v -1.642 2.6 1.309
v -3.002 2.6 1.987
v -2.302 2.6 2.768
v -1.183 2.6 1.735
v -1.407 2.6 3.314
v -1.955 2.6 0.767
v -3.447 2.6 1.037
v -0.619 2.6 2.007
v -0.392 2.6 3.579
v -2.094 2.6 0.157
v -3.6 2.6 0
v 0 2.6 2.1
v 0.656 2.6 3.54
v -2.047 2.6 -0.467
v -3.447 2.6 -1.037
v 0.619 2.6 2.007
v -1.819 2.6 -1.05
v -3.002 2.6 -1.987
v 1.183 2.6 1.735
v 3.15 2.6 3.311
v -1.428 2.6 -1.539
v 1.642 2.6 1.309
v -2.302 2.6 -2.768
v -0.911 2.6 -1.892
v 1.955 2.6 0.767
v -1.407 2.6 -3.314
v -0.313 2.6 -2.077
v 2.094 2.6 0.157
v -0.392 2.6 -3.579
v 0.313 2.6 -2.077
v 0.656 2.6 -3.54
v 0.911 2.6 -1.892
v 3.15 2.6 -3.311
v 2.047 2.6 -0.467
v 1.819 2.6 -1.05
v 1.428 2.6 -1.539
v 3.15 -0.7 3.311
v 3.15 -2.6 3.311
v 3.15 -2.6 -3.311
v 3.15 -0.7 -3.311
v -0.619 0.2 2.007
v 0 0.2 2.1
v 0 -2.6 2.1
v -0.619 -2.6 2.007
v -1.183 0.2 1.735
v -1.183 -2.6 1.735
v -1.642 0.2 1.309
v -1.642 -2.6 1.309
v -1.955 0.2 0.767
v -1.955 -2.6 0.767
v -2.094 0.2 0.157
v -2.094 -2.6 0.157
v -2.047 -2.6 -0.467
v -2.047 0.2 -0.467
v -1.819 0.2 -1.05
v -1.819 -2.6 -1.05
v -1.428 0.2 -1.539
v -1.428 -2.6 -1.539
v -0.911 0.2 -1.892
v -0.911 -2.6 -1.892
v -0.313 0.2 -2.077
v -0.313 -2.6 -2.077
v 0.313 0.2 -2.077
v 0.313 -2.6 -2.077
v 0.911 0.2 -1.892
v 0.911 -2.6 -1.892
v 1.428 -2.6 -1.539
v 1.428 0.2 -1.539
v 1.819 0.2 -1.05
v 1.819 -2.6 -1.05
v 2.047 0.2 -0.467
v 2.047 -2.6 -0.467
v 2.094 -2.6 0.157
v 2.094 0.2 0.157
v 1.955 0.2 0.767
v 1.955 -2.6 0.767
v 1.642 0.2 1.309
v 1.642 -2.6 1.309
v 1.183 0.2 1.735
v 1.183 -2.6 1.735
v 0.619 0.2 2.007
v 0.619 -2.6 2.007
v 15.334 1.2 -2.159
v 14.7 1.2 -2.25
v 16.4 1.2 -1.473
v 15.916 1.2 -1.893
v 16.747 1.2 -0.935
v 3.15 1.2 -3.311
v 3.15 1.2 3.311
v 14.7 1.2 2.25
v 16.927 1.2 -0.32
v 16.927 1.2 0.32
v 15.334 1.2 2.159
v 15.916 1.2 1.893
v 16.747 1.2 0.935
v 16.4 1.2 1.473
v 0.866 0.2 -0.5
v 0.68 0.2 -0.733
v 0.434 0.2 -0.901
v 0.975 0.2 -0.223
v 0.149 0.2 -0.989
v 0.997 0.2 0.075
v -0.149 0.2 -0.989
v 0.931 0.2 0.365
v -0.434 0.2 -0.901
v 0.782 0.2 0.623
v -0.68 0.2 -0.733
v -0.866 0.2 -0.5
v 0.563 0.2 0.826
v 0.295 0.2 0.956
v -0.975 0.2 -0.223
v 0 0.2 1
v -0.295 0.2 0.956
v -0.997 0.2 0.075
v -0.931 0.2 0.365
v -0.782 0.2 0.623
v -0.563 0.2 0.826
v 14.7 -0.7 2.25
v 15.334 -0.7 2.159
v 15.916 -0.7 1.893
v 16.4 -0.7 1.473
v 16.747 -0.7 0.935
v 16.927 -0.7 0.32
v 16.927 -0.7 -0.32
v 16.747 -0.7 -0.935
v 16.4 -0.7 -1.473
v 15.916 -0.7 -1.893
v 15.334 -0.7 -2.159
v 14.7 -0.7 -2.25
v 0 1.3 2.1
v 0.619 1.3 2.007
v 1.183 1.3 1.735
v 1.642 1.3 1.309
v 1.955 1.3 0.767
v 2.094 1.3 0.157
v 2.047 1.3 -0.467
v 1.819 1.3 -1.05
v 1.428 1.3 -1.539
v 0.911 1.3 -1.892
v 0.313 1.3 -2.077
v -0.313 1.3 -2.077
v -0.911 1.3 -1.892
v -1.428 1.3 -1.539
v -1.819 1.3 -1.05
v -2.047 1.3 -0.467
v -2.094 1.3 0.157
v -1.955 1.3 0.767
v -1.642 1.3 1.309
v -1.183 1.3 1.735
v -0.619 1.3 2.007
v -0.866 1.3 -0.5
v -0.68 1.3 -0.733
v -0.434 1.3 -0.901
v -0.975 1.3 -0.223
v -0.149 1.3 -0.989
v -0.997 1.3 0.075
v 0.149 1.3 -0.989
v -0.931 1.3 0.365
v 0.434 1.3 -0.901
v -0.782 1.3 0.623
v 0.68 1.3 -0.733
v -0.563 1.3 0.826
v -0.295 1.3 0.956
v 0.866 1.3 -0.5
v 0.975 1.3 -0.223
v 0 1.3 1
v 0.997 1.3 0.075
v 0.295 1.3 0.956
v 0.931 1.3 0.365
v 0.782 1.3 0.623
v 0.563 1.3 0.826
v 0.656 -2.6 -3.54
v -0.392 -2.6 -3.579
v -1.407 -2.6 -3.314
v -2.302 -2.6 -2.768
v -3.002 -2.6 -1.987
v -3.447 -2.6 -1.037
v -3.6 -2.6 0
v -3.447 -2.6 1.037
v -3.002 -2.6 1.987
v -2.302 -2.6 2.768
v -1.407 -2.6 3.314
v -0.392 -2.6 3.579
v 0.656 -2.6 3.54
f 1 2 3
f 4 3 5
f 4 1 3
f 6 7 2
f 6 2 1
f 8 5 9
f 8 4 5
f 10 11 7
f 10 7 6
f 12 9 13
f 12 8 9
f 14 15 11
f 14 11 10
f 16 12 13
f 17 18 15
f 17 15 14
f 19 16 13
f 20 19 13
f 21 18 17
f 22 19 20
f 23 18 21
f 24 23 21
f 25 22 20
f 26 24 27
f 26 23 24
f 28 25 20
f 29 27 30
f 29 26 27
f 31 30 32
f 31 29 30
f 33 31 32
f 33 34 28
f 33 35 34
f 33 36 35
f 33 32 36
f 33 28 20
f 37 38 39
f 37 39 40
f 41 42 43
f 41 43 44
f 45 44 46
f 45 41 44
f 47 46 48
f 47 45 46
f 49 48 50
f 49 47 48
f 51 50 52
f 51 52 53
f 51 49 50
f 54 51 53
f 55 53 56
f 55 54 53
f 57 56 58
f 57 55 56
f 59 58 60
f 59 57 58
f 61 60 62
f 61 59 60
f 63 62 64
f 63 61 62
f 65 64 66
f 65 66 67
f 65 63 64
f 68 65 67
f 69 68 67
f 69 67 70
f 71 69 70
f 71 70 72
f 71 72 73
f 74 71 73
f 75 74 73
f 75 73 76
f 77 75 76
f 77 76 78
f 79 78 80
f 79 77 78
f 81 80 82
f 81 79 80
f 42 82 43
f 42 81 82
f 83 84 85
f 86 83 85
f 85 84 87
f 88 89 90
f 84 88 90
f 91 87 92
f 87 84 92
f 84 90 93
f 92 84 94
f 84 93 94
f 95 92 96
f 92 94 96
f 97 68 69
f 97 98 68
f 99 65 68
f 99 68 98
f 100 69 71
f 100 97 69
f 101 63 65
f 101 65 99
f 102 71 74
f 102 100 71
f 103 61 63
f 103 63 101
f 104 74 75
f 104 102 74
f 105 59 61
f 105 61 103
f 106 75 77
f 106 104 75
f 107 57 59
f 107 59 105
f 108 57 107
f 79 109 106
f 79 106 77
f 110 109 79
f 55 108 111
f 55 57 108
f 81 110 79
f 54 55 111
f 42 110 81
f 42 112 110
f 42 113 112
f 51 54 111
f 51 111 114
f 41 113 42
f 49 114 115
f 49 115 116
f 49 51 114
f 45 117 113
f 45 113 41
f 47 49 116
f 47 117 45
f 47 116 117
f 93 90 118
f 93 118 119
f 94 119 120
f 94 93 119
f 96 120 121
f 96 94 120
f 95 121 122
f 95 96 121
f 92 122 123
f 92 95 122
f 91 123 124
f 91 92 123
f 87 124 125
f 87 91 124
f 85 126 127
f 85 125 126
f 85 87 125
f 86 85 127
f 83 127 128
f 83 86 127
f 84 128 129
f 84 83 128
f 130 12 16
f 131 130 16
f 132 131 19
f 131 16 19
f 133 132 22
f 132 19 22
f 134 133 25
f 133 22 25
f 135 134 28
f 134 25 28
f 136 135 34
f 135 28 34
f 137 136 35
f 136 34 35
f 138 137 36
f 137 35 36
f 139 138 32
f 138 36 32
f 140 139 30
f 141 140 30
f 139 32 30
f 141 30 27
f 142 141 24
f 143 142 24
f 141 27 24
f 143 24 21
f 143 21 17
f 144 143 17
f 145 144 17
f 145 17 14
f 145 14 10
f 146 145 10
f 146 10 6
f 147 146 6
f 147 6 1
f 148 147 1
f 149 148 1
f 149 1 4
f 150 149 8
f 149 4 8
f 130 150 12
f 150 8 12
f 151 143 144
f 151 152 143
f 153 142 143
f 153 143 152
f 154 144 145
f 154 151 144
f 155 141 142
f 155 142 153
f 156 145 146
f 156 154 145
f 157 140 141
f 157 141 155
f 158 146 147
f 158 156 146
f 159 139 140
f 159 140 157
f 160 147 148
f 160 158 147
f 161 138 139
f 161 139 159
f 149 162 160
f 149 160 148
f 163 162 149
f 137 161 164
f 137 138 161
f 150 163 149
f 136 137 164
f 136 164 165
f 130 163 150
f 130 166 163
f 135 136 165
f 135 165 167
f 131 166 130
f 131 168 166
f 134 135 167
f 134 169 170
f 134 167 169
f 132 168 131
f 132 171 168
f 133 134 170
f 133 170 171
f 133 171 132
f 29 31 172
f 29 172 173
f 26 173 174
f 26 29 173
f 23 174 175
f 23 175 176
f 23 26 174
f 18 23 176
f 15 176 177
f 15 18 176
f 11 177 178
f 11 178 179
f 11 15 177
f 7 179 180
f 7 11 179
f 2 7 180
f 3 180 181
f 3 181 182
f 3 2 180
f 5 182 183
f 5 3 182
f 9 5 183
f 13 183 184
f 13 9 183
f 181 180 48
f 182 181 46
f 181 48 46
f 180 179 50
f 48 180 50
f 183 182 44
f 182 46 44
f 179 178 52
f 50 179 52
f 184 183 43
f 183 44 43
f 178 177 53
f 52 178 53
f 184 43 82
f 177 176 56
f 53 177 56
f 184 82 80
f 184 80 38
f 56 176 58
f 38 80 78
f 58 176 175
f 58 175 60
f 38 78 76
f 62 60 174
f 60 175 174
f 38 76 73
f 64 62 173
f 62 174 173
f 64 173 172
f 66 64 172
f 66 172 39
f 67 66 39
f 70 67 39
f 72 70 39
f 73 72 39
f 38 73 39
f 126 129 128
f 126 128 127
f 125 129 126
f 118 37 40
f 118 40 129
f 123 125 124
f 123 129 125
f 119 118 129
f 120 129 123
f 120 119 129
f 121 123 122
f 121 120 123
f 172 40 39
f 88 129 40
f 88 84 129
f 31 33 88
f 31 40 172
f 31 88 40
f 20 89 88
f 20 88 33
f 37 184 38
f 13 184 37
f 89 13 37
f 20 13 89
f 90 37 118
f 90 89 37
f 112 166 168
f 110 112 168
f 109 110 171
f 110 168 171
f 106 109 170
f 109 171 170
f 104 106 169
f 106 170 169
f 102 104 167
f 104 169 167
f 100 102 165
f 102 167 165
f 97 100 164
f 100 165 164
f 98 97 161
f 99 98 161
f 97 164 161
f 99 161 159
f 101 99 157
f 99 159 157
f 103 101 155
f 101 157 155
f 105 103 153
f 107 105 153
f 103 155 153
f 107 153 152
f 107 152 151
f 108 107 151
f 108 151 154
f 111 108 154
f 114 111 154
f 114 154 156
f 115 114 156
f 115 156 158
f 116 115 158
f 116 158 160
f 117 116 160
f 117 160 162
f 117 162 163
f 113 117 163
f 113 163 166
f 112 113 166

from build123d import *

# Parameters (mm, degrees)
SALIENTE_EXTRUIR2_DEPTH = 2.6
CROQUIS3_R              = 2.1
CORTAR_EXTRUIR1_DEPTH   = 1.3
CROQUIS5_R              = 1
CORTAR_EXTRUIR2_DEPTH   = 5
CORTAR_EXTRUIR3_START   = -2.8
CROQUIS6_R              = 2.1
CORTAR_EXTRUIR3_DEPTH   = 2.8
CROQUIS7_W              = 13.8
CROQUIS7_H              = 1.9
CORTAR_EXTRUIR4_DEPTH   = 5
CROQUIS10_W             = 13.8
CROQUIS10_H             = 2.15
CORTAR_EXTRUIR6_DEPTH   = 5


with BuildPart() as part:
    # Croquis1 → Saliente-Extruir2 (new, symmetric)
    with BuildSketch(Plane(origin=(0, 0, 0), x_dir=(1, 0, 0), z_dir=(0, 1, 0))):
        with BuildLine():
            Line((14.7, 2.25), (0.655694373, 3.53978317))
            ThreePointArc((0.655694373, 3.53978317), (-3.6, 0), (0.655694373, -3.53978317))
            Line((0.655694373, -3.53978317), (14.7, -2.25))
            ThreePointArc((14.7, -2.25), (16.95, 0), (14.7, 2.25))
        make_face()
    extrude(amount=SALIENTE_EXTRUIR2_DEPTH, both=True)

    # Croquis3 → Cortar-Extruir1 (cut)
    with BuildSketch(Plane(origin=(0, 2.6, 0), x_dir=(1, 0, 0), z_dir=(0, 1, 0))):
        with Locations(Location((0, 0, 0), (0, 0, 270))):
            Circle(CROQUIS3_R)
    extrude(amount=-CORTAR_EXTRUIR1_DEPTH, mode=Mode.SUBTRACT)

    # Croquis5 → Cortar-Extruir2 (cut)
    with BuildSketch(Plane(origin=(0, 1.3, 0), x_dir=(1, 0, 0), z_dir=(0, 1, 0))):
        with Locations(Location((0, 0, 0), (0, 0, 270))):
            Circle(CROQUIS5_R)
    extrude(amount=-CORTAR_EXTRUIR2_DEPTH, mode=Mode.SUBTRACT)

    # Croquis6 → Cortar-Extruir3 (cut)
    with BuildSketch(Plane.XZ.offset(2.6).offset(CORTAR_EXTRUIR3_START)):
        with Locations(Location((0, 0, 0), (0, 0, 90))):
            Circle(CROQUIS6_R)
    extrude(amount=CORTAR_EXTRUIR3_DEPTH, mode=Mode.SUBTRACT)

    # Croquis7 → Cortar-Extruir4 (cut, symmetric)
    with BuildSketch(Plane.XY):
        with Locations((10.05, -1.65)):
            Rectangle(CROQUIS7_W, CROQUIS7_H)
    extrude(amount=CORTAR_EXTRUIR4_DEPTH, both=True, mode=Mode.SUBTRACT)

    # Croquis10 → Cortar-Extruir6 (cut, symmetric)
    with BuildSketch(Plane.XY):
        with Locations((10.05, 2.274888949)):
            Rectangle(CROQUIS10_W, CROQUIS10_H)
    extrude(amount=CORTAR_EXTRUIR6_DEPTH, both=True, mode=Mode.SUBTRACT)


solid = part.part
